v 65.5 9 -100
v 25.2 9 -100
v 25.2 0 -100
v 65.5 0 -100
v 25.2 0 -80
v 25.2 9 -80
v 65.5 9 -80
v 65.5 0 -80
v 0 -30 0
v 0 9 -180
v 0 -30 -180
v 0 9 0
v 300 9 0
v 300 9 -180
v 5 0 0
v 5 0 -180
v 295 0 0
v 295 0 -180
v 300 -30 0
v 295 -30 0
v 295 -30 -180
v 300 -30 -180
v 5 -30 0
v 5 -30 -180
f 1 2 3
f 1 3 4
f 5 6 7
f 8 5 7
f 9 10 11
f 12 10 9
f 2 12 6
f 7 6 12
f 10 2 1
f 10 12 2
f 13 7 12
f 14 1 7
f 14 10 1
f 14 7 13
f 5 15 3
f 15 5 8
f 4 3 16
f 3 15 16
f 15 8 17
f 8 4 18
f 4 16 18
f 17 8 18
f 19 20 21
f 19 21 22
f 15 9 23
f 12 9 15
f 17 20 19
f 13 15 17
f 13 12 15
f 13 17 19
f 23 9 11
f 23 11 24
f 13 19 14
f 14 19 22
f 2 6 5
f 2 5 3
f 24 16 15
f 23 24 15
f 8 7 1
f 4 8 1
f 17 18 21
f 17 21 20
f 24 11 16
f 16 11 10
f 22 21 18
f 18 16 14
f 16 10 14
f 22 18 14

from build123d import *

# Parameters (mm, degrees)
SKETCH1_W           = 300
SKETCH1_H           = 180
BOSS_EXTRUDE1_DEPTH = 9
SKETCH2_W           = 5
SKETCH2_H           = 180
BOSS_EXTRUDE2_DEPTH = 30
SKETCH3_W           = 40.3
SKETCH3_H           = 20
CUT_EXTRUDE1_DEPTH  = 9


with BuildPart() as part:
    # Sketch1 → Boss-Extrude1 (new body)
    with BuildSketch(Plane(origin=(0, 0, 0), x_dir=(1, 0, 0), z_dir=(0, 1, 0))):
        with Locations((150, 90)):
            Rectangle(SKETCH1_W, SKETCH1_H)
    extrude(amount=BOSS_EXTRUDE1_DEPTH)

    # Sketch2 → Boss-Extrude2 (add)
    with BuildSketch(Plane.XZ):
        with Locations((2.5, -90)):
            Rectangle(SKETCH2_W, SKETCH2_H)
        with Locations((297.5, -90)):
            Rectangle(SKETCH2_W, SKETCH2_H)
    extrude(amount=BOSS_EXTRUDE2_DEPTH)

    # Sketch3 → Cut-Extrude1 (cut)
    with BuildSketch(Plane(origin=(0, 9, 0), x_dir=(1, 0, 0), z_dir=(0, 1, 0))):
        with Locations((45.35, 90)):
            Rectangle(SKETCH3_W, SKETCH3_H)
    extrude(amount=-CUT_EXTRUDE1_DEPTH, mode=Mode.SUBTRACT)


solid = part.part
